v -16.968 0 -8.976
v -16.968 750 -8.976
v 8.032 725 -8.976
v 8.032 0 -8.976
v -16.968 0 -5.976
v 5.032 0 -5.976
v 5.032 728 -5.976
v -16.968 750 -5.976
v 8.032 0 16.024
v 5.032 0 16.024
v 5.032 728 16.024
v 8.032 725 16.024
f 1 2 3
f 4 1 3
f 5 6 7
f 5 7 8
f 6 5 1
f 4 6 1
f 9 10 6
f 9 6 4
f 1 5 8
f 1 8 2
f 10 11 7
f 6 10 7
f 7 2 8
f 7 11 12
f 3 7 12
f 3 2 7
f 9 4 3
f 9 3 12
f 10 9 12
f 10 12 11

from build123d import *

# Parameters (mm, degrees)
F1_DEPTH = 750
F3_DEPTH = 25


with BuildPart() as f1:
    # F0 (on Front) → F1 (new body)
    with BuildSketch(Plane.XZ):
        Polygon((5.032131, -5.975653), (-16.967869, -5.975653), (-16.967869, -8.975653), (8.032131, -8.975653), (8.032131, 16.024347), (5.032131, 16.024347), align=None)
    extrude(amount=F1_DEPTH)

    # F2 (on face) → F3 (cut)
    with BuildSketch(Plane(origin=(0, 0, -8.975653), x_dir=(1, 0, 0), z_dir=(0, 0, -1))):
        Polygon((8.032131, 750), (-16.967869, 750), (8.032131, 725), align=None)
    extrude(amount=-F3_DEPTH, mode=Mode.SUBTRACT)


with BuildPart() as f4_1:
    # F4: instance of F1
    add(f1.part.mirror(Plane.XZ))


solid = f4_1.part
